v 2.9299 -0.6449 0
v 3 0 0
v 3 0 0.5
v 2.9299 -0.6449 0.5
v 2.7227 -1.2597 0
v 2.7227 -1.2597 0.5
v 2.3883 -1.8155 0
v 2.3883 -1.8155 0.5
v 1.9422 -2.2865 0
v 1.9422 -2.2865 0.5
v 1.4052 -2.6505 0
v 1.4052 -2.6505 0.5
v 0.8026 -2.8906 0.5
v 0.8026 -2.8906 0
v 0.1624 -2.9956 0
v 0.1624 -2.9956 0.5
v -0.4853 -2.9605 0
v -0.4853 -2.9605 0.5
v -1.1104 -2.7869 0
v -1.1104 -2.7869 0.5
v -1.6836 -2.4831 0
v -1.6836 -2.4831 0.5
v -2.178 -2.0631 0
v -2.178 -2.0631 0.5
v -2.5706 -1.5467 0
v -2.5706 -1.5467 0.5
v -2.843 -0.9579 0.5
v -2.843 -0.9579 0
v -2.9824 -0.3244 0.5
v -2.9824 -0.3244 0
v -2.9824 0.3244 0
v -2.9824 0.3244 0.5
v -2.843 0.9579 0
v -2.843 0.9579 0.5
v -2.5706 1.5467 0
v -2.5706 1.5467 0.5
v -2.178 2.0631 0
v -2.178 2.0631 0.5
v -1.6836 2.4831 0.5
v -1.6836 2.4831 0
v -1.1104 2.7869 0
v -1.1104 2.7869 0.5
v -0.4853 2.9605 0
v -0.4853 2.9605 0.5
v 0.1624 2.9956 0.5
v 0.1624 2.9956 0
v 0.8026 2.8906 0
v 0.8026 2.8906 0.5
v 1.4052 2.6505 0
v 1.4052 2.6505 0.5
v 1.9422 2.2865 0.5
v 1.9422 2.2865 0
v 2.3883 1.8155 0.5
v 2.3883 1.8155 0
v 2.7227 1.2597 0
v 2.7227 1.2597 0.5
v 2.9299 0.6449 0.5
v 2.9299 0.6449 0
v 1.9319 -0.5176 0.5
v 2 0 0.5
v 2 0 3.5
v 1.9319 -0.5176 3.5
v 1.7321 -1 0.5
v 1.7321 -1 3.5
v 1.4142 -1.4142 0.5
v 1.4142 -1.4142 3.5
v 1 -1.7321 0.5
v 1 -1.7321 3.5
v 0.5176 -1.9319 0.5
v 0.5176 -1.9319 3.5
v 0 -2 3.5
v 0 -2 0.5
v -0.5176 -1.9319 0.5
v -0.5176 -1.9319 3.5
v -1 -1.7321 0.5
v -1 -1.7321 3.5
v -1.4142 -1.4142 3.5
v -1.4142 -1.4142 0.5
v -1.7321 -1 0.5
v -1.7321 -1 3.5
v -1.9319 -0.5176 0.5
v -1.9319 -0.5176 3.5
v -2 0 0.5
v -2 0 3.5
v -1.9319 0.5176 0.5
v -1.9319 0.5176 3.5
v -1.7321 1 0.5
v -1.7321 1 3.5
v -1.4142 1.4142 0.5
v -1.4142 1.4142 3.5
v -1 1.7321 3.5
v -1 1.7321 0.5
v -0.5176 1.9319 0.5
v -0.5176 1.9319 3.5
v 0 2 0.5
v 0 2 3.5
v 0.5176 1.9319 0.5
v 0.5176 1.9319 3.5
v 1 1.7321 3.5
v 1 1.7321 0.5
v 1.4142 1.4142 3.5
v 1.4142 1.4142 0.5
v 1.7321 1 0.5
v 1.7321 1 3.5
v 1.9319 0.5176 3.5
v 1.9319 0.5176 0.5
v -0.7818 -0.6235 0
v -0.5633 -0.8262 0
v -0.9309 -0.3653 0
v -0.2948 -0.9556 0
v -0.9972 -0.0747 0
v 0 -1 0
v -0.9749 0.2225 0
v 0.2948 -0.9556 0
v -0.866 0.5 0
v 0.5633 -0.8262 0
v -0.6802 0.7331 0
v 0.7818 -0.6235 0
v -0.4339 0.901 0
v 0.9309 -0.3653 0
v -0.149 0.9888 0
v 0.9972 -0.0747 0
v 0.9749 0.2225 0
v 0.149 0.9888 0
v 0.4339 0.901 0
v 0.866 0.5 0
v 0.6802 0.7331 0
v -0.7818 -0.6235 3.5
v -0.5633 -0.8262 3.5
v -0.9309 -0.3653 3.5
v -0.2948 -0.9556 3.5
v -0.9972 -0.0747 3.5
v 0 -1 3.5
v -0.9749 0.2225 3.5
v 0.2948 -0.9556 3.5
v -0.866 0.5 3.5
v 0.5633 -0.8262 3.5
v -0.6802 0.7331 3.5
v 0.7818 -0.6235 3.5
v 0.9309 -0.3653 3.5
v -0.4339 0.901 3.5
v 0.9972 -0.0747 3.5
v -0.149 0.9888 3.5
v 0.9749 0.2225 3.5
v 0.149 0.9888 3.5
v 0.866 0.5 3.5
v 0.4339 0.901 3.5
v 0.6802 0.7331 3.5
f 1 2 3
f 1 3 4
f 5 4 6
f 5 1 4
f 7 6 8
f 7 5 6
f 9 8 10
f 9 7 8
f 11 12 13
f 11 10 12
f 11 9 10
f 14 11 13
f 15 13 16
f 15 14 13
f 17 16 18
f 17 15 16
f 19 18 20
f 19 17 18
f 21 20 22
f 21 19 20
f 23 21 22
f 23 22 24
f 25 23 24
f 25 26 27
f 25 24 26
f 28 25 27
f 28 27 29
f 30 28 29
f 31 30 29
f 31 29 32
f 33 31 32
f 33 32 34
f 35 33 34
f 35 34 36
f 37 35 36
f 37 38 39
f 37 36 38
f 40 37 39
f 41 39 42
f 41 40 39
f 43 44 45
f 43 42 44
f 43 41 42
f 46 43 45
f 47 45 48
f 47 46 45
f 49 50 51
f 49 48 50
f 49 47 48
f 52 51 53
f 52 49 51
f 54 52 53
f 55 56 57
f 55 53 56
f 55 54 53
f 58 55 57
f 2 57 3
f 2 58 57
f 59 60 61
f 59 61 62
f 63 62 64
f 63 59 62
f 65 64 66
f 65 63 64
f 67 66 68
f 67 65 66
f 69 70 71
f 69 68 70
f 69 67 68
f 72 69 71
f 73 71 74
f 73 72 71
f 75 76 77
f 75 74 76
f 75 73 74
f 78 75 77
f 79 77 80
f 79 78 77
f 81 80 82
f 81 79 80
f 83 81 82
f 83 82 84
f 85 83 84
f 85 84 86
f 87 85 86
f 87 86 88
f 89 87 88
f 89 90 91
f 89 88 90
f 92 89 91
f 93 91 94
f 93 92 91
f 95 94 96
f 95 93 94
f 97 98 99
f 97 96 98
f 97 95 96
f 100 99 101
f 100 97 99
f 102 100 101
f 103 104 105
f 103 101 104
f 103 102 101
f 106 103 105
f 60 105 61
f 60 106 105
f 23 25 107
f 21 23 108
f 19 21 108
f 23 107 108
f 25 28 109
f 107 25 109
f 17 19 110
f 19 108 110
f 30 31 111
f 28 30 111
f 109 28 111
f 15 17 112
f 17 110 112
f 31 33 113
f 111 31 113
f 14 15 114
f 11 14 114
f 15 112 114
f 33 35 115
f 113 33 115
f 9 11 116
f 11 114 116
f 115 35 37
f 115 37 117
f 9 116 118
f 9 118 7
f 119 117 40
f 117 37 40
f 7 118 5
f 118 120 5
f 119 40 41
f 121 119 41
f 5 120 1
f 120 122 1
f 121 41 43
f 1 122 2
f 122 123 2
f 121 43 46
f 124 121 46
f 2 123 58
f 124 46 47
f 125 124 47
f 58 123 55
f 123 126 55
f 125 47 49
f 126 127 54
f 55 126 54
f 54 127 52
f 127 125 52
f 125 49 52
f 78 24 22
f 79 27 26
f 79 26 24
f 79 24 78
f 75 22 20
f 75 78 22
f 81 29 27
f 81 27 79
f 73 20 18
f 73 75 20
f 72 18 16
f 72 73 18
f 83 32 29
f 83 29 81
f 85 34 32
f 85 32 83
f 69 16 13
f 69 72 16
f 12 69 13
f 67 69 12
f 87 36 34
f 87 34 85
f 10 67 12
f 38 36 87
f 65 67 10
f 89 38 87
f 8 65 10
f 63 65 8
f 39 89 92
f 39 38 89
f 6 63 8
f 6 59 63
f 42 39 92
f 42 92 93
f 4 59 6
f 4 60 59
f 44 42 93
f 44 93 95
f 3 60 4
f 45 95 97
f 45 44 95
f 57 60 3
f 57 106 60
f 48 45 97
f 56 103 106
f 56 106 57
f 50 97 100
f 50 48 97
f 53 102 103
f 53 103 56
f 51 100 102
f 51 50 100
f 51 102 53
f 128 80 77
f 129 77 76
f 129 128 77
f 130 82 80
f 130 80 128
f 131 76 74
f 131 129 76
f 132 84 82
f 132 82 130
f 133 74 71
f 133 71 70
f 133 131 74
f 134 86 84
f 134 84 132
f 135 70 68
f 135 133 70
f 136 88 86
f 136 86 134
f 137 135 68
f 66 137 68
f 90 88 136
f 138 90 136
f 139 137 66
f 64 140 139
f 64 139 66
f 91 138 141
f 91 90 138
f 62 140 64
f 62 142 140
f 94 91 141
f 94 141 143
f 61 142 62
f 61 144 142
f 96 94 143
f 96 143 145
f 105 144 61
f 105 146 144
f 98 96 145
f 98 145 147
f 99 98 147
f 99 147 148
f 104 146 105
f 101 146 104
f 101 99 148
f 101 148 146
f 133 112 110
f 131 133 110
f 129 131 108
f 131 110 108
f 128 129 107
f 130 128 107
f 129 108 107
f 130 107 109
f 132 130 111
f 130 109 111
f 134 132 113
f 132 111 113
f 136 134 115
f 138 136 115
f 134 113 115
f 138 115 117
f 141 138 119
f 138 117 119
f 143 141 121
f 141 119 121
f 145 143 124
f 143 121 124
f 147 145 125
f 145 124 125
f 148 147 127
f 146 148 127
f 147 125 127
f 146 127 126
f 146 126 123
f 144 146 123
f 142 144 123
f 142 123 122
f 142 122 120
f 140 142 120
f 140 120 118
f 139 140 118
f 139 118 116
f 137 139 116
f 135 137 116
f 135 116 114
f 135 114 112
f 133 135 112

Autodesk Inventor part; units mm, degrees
ref_plane "YZ Plane" through (0, 0, 0) normal (1, 0, 0) x (0, 1, 0)
ref_plane "XZ Plane" through (0, 0, 0) normal (0, 1, 0) x (-1, 0, 0)
ref_plane "XY Plane" through (0, 0, 0) normal (0, 0, 1) x (1, 0, 0)
sketch "Sketch1" plane through (0, 0, 0) normal (0, 0, 1) x (1, 0, 0)
  circle A0 centre (0, 0) radius 3
  dimension "d0" = 6
extrude "Extrusion1" add sketch "Sketch1" along normal blind 0.5
sketch "Sketch2" plane through (0, 0, 0.5) normal (0, 0, 1) x (1, 0, 0)
  circle A0 centre (0, 0) radius 3 projected
  circle A1 centre (0, 0) radius 2
  dimension "d3" = 4
extrude "Extrusion2" add sketch "Sketch2" along normal blind 3 contours A1
hole "Hole1" at (0, 0, 3.5) direction (0, 0, -1) diameter 2 depth 3.5
